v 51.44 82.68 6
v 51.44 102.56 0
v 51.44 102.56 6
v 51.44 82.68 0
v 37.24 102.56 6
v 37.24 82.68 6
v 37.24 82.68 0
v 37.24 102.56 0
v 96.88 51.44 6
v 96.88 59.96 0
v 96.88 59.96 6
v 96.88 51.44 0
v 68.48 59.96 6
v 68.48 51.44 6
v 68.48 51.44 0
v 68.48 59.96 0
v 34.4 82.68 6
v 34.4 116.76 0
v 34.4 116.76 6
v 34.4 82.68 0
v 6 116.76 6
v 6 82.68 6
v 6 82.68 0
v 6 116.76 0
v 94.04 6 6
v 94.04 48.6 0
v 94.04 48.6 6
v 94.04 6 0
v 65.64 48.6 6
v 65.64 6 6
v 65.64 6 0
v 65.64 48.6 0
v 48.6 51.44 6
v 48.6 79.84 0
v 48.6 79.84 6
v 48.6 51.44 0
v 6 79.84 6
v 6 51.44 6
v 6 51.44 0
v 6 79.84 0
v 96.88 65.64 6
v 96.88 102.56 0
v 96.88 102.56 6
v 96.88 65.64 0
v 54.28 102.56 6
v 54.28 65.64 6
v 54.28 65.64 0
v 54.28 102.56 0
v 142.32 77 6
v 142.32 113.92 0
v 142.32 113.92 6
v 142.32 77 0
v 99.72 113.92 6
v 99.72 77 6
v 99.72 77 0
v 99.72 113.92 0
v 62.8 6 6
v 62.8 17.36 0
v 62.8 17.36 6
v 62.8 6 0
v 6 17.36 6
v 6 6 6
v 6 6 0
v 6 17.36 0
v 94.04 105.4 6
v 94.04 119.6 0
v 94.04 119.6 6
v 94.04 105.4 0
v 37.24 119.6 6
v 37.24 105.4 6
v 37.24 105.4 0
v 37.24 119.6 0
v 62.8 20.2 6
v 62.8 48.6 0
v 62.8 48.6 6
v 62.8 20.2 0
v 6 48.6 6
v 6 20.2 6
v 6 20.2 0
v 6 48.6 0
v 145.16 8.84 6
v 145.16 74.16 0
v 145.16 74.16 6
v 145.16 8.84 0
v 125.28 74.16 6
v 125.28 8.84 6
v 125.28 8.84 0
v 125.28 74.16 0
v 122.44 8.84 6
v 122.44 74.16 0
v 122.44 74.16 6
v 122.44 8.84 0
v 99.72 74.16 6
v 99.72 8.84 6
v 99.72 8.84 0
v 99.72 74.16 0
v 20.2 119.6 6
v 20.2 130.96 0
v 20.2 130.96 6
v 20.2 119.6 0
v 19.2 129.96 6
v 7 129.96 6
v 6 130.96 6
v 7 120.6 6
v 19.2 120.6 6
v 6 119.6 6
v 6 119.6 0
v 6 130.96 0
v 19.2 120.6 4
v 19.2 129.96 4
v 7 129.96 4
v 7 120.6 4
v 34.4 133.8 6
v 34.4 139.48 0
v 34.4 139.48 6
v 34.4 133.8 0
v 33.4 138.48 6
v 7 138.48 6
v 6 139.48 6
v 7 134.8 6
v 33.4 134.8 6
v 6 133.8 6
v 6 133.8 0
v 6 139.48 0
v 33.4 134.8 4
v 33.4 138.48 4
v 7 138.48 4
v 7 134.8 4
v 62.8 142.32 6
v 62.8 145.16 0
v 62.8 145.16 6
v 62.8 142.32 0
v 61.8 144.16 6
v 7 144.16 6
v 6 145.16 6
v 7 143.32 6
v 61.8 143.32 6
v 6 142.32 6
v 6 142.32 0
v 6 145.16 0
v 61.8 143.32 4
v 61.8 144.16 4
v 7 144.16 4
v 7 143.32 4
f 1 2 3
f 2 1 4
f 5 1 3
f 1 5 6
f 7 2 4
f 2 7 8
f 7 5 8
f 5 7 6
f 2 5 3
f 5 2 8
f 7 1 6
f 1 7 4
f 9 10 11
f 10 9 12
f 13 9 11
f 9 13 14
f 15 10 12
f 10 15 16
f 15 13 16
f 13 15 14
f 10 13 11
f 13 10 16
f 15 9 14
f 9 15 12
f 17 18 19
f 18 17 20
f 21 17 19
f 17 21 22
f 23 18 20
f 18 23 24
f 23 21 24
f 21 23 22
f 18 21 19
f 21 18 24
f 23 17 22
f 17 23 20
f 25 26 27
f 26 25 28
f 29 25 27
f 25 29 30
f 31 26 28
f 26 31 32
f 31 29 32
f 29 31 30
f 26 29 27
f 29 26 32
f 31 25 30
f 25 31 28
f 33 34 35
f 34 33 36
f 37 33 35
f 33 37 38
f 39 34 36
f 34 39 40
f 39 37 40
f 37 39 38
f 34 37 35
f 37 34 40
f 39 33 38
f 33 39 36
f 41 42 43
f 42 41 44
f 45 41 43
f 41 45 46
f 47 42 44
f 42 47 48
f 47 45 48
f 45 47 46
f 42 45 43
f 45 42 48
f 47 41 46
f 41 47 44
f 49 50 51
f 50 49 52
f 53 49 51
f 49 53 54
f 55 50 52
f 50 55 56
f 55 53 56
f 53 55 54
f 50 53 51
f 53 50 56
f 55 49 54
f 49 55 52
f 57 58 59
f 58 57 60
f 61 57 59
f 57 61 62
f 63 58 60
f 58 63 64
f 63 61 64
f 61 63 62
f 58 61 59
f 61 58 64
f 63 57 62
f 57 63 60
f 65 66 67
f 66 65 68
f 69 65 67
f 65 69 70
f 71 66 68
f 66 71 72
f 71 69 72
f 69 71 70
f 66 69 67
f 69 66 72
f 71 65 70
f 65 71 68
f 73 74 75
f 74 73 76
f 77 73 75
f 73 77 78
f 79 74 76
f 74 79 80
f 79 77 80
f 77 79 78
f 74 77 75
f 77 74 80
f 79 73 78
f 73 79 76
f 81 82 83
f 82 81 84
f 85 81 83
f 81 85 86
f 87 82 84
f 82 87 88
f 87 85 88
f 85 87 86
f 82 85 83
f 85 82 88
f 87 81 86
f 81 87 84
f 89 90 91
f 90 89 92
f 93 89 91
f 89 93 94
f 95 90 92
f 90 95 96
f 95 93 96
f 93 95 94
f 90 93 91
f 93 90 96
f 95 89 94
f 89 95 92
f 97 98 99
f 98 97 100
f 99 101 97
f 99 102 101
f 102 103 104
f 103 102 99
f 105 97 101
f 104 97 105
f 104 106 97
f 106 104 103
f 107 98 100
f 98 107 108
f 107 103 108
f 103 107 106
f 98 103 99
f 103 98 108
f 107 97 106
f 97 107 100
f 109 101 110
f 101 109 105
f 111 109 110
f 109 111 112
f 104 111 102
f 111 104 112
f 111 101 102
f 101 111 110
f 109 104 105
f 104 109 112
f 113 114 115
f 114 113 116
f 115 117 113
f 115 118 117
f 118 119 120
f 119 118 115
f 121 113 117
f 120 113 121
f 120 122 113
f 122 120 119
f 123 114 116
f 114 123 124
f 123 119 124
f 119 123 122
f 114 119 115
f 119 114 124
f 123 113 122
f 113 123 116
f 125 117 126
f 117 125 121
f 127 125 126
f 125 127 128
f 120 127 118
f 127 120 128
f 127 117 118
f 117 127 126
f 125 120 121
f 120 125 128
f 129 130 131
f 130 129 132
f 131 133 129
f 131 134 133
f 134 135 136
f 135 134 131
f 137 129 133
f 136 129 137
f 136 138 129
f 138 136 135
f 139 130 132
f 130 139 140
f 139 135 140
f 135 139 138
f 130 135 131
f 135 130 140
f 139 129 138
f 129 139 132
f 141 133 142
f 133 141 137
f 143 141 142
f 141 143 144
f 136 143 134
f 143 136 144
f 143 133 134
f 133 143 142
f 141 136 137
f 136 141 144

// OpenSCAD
// TODO: Extend/retract text
// TODO: Differentiate the key pieces in a way that is printable
// TODO: Add another layout that is printable and doesn't give away any solutions

/* [Render Parameters] */
// ----------------------------------------------------------------------

// Render quality (fast preview does not render threads).
render_quality = "fast preview"; // ["fast preview", "preview", "final rendering"]


/* [Parts] */
models = "pieces"; // ["pieces", "case", "lid"]


/* [Piece Layout] */
// ----------------------------------------------------------------------

// How to layout the pieces
piece_layout = "key0"; // ["linear", "square", "key0", "key1", "key2"]

// Render pieces in exploded layout (printable). 
pieces_exploded = "yes"; // ["yes", "no"]

/* [Piece Parameters] */
// ----------------------------------------------------------------------

// Mark the key pieces with an indent on the top
mark_key_pieces = "yes"; // ["yes", "no"]


// The total height of the vial and cap when assembled. [mm]
piece_height = 6; 

// how big to scale the pieces by. [mm]
piece_scale = 2.84;

// Label type for the pieces. 
piece_label_type = "None"; // ["None", "Piece/Key Names", "Width X Height", "Edge Dimensions"]


// List fonts on your system:
piece_font = "SF Mono:style=Bold";
// fc-list -f "%-60{{%{family[0]}%{:style[0]=}}}%{file}\n" | sort


/* [Box Parameters] */
// ----------------------------------------------------------------------

// The shape of the box. Square has 1 solution, 3_keys has 3 soutions. 
box_layout = "square"; // ["square", "3_keys"]

// How thick to make the walls for the box. [mm]
box_wall_t = 3;

/* [Hidden] */
// ----------------------------------------------------------------------
// (This is a special section that OpenSCAD will not show in the 
// customizer. Used for private variables. 

$fn = 30;

// The scale of text on pieces.
// text_scale = 1.0;
text_scale = 1.0;

// The margin of text on pieces as a percentage of the the height of the text. 
text_margin = 0.25;


// The following arrays contain:
// [size, offset_rotation_packed, offset_rotation_exploded]
// [[width, height], [offset_x, offset_y, rotation], [offset_x, offset_y, rotation]],

ps_linear = [
    [[7, 5], [0, 0, 0], [0, 0, 0]],
    [[3, 10], [7, 0, 0], [8, 0, 0]],
    [[12, 10], [10, 0, 0], [12, 0, 0]],
    [[15, 10], [22, 0, 0], [25, 0, 0]],
    [[15, 10], [37, 0, 0], [41, 0, 0]],
    [[13, 15], [52, 0, 0], [57, 0, 0]],
    [[15, 13], [65, 0, 0], [71, 0, 0]],
    [[4, 20], [80, 0, 0], [87, 0, 0]],
    [[20, 5], [84, 0, 0], [92, 0, 0]],
    [[10, 20], [104, 0, 0], [113, 0, 0]],
    [[23, 7], [114, 0, 0], [124, 0, 0]],
    [[8, 23], [137, 0, 0], [148, 0, 0]],
    // Keys
    [[5, 4], [15, 14, 0], [157, 0, 0]],
    [[10, 2], [0, 30, 0], [163, 0, 0]],
    [[20, 1], [10, 15, 0], [174, 0, 0]]
];

ps_square = [
    [[5, 7], [30, 20, 0], [33, 23, 0]],
    [[10, 3], [10, 27, 0], [11, 30, 0]],
    [[10, 12], [30, 8, 0], [33, 9, 0]],
    [[10, 15], [0, 0, 0], [0, 0, 0]],
    [[10, 15], [0, 15, 0], [0, 16, 0]],
    [[15, 13], [20, 27, 0], [22, 31, 0]],
    [[13, 15], [17, 8, 0], [19, 9, 0]],
    [[20, 4], [10, 23, 0], [11, 25, 0]],
    [[5, 20], [35, 20, 0], [39, 22, 0]],
    [[20, 10], [0, 30, 0], [0, 34, 0]],
    [[7, 23], [10, 0, 0], [11, 0, 0]],
    [[23, 8], [17, 0, 0], [19, 0, 0]],
    // Keys
    [[5, 4], [0, 45, 0], [0, 45, 0]],
    [[10, 2], [6, 45, 0], [6, 45, 0]],
    [[20, 1], [17, 45, 0], [17, 45, 0]]
];

ps_key0 = [
    [[5, 7], [10, 24, 0], [11, 27, 0]],
    [[10, 3], [20, 15, 0], [22, 16, 0]],
    [[10, 12], [0, 24, 0], [0, 27, 0]],
    [[10, 15], [20, 0, 0], [21, 0, 0]],
    [[15, 10], [0, 14, 0], [0, 16, 0]],
    [[15, 13], [15, 18, 0], [17, 21, 0]],
    [[15, 13], [30, 23, 0], [33, 25, 0]],
    [[20, 4], [0, 0, 0], [0, 0, 0]],
    [[20, 5], [10, 31, 0], [11, 35, 0]],
    [[20, 10], [0, 4, 0], [0, 5, 0]],
    [[7, 23], [38, 0, 0], [42, 1, 0]],
    [[8, 23], [30, 0, 0], [33, 1, 0]],
    // Keys
    [[5, 4], [15, 14, 0], [0, 40, 0]],
    [[10, 2], [0, 45, 0], [0, 45, 0]],
    [[20, 1], [0, 48, 0], [0, 48, 0]],
];

ps_key1 = [
    [[5, 7], [15, 13, 0], [17, 14, 0]],
    [[10, 3], [20, 13, 0], [23, 14, 0]],
    [[10, 12], [10, 20, 0], [11, 22, 0]],
    [[10, 15], [0, 0, 0], [0, 0, 0]],
    [[10, 15], [0, 15, 0], [0, 16, 0]],
    [[15, 13], [15, 0, 0], [17, 0, 0]],
    [[15, 13], [30, 23, 0], [34, 24, 0]],
    [[20, 4], [0, 32, 0], [0, 35, 0]],
    [[5, 20], [10, 0, 0], [11, 0, 0]],
    [[10, 20], [20, 16, 0], [23, 18, 0]],
    [[7, 23], [38, 0, 0], [43, 0, 0]],
    [[8, 23], [30, 0, 0], [34, 0, 0]],
    // Keys
    [[5, 4], [0, 40, 0], [0, 40, 0]],
    [[10, 2], [0, 30, 0], [0, 45, 0]],
    [[20, 1], [0, 48, 0], [0, 48, 0]],
];

ps_key2 = [
    [[5, 7], [5, 12, 0], [6, 13, 0]],
    [[10, 3], [10, 16, 0], [12, 18, 0]],
    [[10, 12], [0, 0, 0], [0, 0, 0]],
    [[10, 15], [10, 0, 0], [12, 0, 0]],
    [[10, 15], [20, 0, 0], [23, 0, 0]],
    [[15, 13], [5, 19, 0], [6, 22, 0]],
    [[15, 13], [30, 23, 0], [34, 24, 0]],
    [[20, 4], [0, 32, 0], [0, 36, 0]],
    [[5, 20], [0, 12, 0], [0, 13, 0]],
    [[10, 20], [20, 16, 0], [23, 18, 0]],
    [[7, 23], [38, 0, 0], [43, 0, 0]],
    [[8, 23], [30, 0, 0], [34, 0, 0]],
    // Keys
    [[5, 4], [0, 41, 0], [0, 41, 0]],
    [[10, 2], [0, 46, 0], [0, 46, 0]],
    [[20, 1], [10, 15, 0], [0, 49, 0]]
];

piece_properties = [
    ["Crimson", "P 0", "7 x 5"],
    ["DeepPink", "P 1", "3 x 10"],
    ["Orange", "P 2", "12 x 10"],
    ["Maroon", "P 3", "15 x 10"],
    ["Sienna", "P 4", "15 x 10"],
    ["Chartreuse", "P 5", "13 x 15"],
    ["Honeydew", "P 6", "15 x 13"],
    ["SlateGray", "P 7", "4 x 20"],
    ["Turquoise", "P 8", "20 x 5"],
    ["Plum", "P 9", "10 x 20"],
    ["Indigo", "P 10", "23 x 7"],
    ["Gold", "P 11", "8 x 23"],
    ["Silver", "K 0", "5 x 4"],
    ["Silver", "K 1", "10 x 2"],
    ["Silver", "K 2", "20 x 1"],
];


// Dimensions for key box (rect). Holds up to 3 layers of pieces. 
box_3keys_size = [45, 36, 2.33];

// Dimensions for square box. Holds up to 3 layers of pieces. 
box_square_size = [40, 40, 2.33];

// module render_pieces(layout="solution_square") {
module render_pieces(ps, exploded) {


    indexes = [2, 4, 12, 13];
    translate([2 * box_wall_t, 2 * box_wall_t, piece_height / 2]) {
    // translate([0, 0, piece_height / 2]) {
        // Render in the square solution
        for (i = [0: len(ps) - 1]) {
        // for (a = [0: len(indexes) - 1]) {
            // i = indexes[a];
            // echo(" ------- i: ", i);
        // for (i = [len(ps) - 3: len(ps) - 1]) {
        // for (i = [0: 0]) {
            p = ps[i];
            rect = p[0];
            // color = p[2];
            color = piece_properties[i][0];
            color(color) {
                position = exploded == true ? p[2] : p[1];
                rotate(position.z) {
                    translate([
                        piece_scale * (position.x + rect.x / 2), 
                        piece_scale * (position.y + rect.y / 2), 
                        0
                    ]) {      
                        difference() {
                            // The piece itself
                            cube(
                                size=[
                                    piece_scale * rect.x, 
                                    piece_scale * rect.y, 
                                    piece_height
                                ], 
                                center=true
                            );

                            union() {
                                // Positional data to print text on both sides of the piece. 
                                // Data is as follows: [tranlate.z, rotate.x]
                                text_transforms = [
                                    [1, 0],
                                    [-1, 180]
                                ];

                                // text_margin = 0.25;
                                // text_scale = 1.0;

                                echo("text_scale: ", text_scale);
                                smaller_dimension = min(rect.x, rect.y);
                                echo("smaller_dimension: ", smaller_dimension);

                                // text_margin_d = text_scale * text_margin;
                                text_margin_d = text_margin;
                                // text_scale_clipped = min(text_scale, smaller_dimension - 4 * text_margin_d);
                                text_scale_clipped = min(text_scale, (smaller_dimension - 1 * text_margin_d) / 2);
                                echo("text_scale_clipped: ", text_scale_clipped);

                                if (piece_label_type == "Piece/Key Names" || piece_label_type == "Width X Height") {
                                    for (j = [0: len(text_transforms) - 1]) {
                                        p = text_transforms[j];
                                        translate([0, 0, p[0] * (piece_height) / 4]) 
                                        rotate([p[1], 0, 0])
                                        linear_extrude(height = piece_height / 2) 
                                        text(
                                            text = piece_label_type == "Piece/Key Names" ? piece_properties[i][1] : piece_properties[i][2], 
                                            font = piece_font,
                                            halign = "center", 
                                            valign = "center", 
                                            size = piece_scale * text_scale_clipped
                                        );
                                    }
                                } else if (piece_label_type == "Edge Dimensions") {
                                    for (j = [0: len(text_transforms) - 1]) {
                                        // Loop through each of the 4 sides. 
                                        for (k = [0: 3]) {
                                            if ((3 * text_scale >= rect.y || 3 * text_scale >= rect.x) && k < 2) {
                                                // This avoids printing two dimension numbers on top of each other when they overlap.
                                                // Instead settle for 2 labels instead of 4
                                            } else {
                                                // Rotate and position the dimension label along the edge of the piece. 
                                                p = text_transforms[j];
                                                rotate([0, 0, k * (360 / 4)])
                                                translate([
                                                    0, 
                                                    piece_scale * ((k % 2 == 0 ? rect.y : rect.x) / 2 - text_scale_clipped), 
                                                    p[0] * piece_height / 4
                                                ]) 
                                                rotate([p[1], 0, 180])
                                                linear_extrude(height = piece_height / 2) 
                                                text(
                                                    text = str(k % 2 == 0 ? rect.x : rect.y), 
                                                    font = piece_font,
                                                    halign = "center", 
                                                    valign = "center", 
                                                    size = piece_scale * text_scale_clipped
                                                );

                                                
                                            }
                                        }
                                    }
                                } 

                                if (mark_key_pieces == "yes") {
                                    if (i > len(ps) - 4) {
                                        // key_indent_depth = box_wall_t / 2;
                                        key_indent_depth = 1;
                                        translate([0, 0, (piece_height) / 2]) 
                                        cube(
                                            [
                                                piece_scale * rect.x - 2 * key_indent_depth, 
                                                piece_scale * rect.y - 2 * key_indent_depth, 
                                                4 * key_indent_depth
                                            ], 
                                            center = true
                                        );
                                    }
                                }
                            }
                        }
                    }
                }
            }
        }
    }
}

module render_box(dimensions) {
    slop = dimensions.x / 100;
    
    // Bottom
    bottom_inner = [
        dimensions.x * piece_scale + slop,
        dimensions.y * piece_scale + slop,
        dimensions.z * piece_height + slop
    ];
    bottom_outer = [
        bottom_inner.x + 2 * box_wall_t + slop,
        bottom_inner.y + 2 * box_wall_t + slop,
        bottom_inner.z + 1 * box_wall_t + slop,
    ];

    if (models == "case") {
        color("#996666", alpha = 0.75) {
            translate([
                box_wall_t + bottom_outer.x / 2,
                box_wall_t + bottom_outer.y / 2,
                bottom_outer.z / 2
            ]) {
                difference() {
                    cube(
                        size = bottom_outer, 
                        center = true
                    );

                    // Interior cutaway
                    translate([0, 0, box_wall_t]){
                        cube(
                            size = bottom_inner,
                            center = true
                        );
                    } 
                }
            }
        }
    }

    if (models == "lid") {
        // Top
        top_inner = [
            bottom_outer.x + slop,
            bottom_outer.y + slop,
            bottom_outer.z + slop
        ];
        top_outer = [
            top_inner.x + 2 * box_wall_t + slop,
            top_inner.y + 2 * box_wall_t + slop,
            top_inner.z + 1 * box_wall_t + slop
        ];
        color("#669966", alpha = 0.75) {
            translate([top_outer.x, 0, top_outer.z]) 
            rotate([0, 180, 0])
            translate([
                top_outer.x / 2, 
                top_outer.y / 2, 
                top_outer.z / 2 - 0.01
            ]) {
                difference() {
                    cube(
                        size = top_outer, 
                        center = true
                    );

                    // Interior cutaway
                    translate([0, 0, -box_wall_t]){
                        cube(
                            size = top_inner,
                            center = true
                        );
                    } 
                }
            }
        }
    }
}

module main() {
    if (models == "pieces") {
        if (piece_layout == "linear") {
            render_pieces(
                ps = ps_linear,
                exploded = pieces_exploded == "yes"
            );
        } else if (piece_layout == "square") {
            render_pieces(
                ps = ps_square,
                exploded = pieces_exploded == "yes"
            );
        } else if (piece_layout == "key0") {
            render_pieces(
                ps = ps_key0,
                exploded = pieces_exploded == "yes"
            );
        } else if (piece_layout == "key1") {
            render_pieces(
                ps = ps_key1,
                exploded = pieces_exploded == "yes"
            );
        } else if (piece_layout == "key2") {
            render_pieces(
                ps = ps_key2,
                exploded = pieces_exploded == "yes"
            );
        }
    } else if (models == "case" || models == "lid") {
        if (box_layout == "square") {
            render_box(dimensions=box_square_size);
        } else if (box_layout == "3_keys") {
            render_box(dimensions=box_3keys_size);
        }
    }
}

main();
